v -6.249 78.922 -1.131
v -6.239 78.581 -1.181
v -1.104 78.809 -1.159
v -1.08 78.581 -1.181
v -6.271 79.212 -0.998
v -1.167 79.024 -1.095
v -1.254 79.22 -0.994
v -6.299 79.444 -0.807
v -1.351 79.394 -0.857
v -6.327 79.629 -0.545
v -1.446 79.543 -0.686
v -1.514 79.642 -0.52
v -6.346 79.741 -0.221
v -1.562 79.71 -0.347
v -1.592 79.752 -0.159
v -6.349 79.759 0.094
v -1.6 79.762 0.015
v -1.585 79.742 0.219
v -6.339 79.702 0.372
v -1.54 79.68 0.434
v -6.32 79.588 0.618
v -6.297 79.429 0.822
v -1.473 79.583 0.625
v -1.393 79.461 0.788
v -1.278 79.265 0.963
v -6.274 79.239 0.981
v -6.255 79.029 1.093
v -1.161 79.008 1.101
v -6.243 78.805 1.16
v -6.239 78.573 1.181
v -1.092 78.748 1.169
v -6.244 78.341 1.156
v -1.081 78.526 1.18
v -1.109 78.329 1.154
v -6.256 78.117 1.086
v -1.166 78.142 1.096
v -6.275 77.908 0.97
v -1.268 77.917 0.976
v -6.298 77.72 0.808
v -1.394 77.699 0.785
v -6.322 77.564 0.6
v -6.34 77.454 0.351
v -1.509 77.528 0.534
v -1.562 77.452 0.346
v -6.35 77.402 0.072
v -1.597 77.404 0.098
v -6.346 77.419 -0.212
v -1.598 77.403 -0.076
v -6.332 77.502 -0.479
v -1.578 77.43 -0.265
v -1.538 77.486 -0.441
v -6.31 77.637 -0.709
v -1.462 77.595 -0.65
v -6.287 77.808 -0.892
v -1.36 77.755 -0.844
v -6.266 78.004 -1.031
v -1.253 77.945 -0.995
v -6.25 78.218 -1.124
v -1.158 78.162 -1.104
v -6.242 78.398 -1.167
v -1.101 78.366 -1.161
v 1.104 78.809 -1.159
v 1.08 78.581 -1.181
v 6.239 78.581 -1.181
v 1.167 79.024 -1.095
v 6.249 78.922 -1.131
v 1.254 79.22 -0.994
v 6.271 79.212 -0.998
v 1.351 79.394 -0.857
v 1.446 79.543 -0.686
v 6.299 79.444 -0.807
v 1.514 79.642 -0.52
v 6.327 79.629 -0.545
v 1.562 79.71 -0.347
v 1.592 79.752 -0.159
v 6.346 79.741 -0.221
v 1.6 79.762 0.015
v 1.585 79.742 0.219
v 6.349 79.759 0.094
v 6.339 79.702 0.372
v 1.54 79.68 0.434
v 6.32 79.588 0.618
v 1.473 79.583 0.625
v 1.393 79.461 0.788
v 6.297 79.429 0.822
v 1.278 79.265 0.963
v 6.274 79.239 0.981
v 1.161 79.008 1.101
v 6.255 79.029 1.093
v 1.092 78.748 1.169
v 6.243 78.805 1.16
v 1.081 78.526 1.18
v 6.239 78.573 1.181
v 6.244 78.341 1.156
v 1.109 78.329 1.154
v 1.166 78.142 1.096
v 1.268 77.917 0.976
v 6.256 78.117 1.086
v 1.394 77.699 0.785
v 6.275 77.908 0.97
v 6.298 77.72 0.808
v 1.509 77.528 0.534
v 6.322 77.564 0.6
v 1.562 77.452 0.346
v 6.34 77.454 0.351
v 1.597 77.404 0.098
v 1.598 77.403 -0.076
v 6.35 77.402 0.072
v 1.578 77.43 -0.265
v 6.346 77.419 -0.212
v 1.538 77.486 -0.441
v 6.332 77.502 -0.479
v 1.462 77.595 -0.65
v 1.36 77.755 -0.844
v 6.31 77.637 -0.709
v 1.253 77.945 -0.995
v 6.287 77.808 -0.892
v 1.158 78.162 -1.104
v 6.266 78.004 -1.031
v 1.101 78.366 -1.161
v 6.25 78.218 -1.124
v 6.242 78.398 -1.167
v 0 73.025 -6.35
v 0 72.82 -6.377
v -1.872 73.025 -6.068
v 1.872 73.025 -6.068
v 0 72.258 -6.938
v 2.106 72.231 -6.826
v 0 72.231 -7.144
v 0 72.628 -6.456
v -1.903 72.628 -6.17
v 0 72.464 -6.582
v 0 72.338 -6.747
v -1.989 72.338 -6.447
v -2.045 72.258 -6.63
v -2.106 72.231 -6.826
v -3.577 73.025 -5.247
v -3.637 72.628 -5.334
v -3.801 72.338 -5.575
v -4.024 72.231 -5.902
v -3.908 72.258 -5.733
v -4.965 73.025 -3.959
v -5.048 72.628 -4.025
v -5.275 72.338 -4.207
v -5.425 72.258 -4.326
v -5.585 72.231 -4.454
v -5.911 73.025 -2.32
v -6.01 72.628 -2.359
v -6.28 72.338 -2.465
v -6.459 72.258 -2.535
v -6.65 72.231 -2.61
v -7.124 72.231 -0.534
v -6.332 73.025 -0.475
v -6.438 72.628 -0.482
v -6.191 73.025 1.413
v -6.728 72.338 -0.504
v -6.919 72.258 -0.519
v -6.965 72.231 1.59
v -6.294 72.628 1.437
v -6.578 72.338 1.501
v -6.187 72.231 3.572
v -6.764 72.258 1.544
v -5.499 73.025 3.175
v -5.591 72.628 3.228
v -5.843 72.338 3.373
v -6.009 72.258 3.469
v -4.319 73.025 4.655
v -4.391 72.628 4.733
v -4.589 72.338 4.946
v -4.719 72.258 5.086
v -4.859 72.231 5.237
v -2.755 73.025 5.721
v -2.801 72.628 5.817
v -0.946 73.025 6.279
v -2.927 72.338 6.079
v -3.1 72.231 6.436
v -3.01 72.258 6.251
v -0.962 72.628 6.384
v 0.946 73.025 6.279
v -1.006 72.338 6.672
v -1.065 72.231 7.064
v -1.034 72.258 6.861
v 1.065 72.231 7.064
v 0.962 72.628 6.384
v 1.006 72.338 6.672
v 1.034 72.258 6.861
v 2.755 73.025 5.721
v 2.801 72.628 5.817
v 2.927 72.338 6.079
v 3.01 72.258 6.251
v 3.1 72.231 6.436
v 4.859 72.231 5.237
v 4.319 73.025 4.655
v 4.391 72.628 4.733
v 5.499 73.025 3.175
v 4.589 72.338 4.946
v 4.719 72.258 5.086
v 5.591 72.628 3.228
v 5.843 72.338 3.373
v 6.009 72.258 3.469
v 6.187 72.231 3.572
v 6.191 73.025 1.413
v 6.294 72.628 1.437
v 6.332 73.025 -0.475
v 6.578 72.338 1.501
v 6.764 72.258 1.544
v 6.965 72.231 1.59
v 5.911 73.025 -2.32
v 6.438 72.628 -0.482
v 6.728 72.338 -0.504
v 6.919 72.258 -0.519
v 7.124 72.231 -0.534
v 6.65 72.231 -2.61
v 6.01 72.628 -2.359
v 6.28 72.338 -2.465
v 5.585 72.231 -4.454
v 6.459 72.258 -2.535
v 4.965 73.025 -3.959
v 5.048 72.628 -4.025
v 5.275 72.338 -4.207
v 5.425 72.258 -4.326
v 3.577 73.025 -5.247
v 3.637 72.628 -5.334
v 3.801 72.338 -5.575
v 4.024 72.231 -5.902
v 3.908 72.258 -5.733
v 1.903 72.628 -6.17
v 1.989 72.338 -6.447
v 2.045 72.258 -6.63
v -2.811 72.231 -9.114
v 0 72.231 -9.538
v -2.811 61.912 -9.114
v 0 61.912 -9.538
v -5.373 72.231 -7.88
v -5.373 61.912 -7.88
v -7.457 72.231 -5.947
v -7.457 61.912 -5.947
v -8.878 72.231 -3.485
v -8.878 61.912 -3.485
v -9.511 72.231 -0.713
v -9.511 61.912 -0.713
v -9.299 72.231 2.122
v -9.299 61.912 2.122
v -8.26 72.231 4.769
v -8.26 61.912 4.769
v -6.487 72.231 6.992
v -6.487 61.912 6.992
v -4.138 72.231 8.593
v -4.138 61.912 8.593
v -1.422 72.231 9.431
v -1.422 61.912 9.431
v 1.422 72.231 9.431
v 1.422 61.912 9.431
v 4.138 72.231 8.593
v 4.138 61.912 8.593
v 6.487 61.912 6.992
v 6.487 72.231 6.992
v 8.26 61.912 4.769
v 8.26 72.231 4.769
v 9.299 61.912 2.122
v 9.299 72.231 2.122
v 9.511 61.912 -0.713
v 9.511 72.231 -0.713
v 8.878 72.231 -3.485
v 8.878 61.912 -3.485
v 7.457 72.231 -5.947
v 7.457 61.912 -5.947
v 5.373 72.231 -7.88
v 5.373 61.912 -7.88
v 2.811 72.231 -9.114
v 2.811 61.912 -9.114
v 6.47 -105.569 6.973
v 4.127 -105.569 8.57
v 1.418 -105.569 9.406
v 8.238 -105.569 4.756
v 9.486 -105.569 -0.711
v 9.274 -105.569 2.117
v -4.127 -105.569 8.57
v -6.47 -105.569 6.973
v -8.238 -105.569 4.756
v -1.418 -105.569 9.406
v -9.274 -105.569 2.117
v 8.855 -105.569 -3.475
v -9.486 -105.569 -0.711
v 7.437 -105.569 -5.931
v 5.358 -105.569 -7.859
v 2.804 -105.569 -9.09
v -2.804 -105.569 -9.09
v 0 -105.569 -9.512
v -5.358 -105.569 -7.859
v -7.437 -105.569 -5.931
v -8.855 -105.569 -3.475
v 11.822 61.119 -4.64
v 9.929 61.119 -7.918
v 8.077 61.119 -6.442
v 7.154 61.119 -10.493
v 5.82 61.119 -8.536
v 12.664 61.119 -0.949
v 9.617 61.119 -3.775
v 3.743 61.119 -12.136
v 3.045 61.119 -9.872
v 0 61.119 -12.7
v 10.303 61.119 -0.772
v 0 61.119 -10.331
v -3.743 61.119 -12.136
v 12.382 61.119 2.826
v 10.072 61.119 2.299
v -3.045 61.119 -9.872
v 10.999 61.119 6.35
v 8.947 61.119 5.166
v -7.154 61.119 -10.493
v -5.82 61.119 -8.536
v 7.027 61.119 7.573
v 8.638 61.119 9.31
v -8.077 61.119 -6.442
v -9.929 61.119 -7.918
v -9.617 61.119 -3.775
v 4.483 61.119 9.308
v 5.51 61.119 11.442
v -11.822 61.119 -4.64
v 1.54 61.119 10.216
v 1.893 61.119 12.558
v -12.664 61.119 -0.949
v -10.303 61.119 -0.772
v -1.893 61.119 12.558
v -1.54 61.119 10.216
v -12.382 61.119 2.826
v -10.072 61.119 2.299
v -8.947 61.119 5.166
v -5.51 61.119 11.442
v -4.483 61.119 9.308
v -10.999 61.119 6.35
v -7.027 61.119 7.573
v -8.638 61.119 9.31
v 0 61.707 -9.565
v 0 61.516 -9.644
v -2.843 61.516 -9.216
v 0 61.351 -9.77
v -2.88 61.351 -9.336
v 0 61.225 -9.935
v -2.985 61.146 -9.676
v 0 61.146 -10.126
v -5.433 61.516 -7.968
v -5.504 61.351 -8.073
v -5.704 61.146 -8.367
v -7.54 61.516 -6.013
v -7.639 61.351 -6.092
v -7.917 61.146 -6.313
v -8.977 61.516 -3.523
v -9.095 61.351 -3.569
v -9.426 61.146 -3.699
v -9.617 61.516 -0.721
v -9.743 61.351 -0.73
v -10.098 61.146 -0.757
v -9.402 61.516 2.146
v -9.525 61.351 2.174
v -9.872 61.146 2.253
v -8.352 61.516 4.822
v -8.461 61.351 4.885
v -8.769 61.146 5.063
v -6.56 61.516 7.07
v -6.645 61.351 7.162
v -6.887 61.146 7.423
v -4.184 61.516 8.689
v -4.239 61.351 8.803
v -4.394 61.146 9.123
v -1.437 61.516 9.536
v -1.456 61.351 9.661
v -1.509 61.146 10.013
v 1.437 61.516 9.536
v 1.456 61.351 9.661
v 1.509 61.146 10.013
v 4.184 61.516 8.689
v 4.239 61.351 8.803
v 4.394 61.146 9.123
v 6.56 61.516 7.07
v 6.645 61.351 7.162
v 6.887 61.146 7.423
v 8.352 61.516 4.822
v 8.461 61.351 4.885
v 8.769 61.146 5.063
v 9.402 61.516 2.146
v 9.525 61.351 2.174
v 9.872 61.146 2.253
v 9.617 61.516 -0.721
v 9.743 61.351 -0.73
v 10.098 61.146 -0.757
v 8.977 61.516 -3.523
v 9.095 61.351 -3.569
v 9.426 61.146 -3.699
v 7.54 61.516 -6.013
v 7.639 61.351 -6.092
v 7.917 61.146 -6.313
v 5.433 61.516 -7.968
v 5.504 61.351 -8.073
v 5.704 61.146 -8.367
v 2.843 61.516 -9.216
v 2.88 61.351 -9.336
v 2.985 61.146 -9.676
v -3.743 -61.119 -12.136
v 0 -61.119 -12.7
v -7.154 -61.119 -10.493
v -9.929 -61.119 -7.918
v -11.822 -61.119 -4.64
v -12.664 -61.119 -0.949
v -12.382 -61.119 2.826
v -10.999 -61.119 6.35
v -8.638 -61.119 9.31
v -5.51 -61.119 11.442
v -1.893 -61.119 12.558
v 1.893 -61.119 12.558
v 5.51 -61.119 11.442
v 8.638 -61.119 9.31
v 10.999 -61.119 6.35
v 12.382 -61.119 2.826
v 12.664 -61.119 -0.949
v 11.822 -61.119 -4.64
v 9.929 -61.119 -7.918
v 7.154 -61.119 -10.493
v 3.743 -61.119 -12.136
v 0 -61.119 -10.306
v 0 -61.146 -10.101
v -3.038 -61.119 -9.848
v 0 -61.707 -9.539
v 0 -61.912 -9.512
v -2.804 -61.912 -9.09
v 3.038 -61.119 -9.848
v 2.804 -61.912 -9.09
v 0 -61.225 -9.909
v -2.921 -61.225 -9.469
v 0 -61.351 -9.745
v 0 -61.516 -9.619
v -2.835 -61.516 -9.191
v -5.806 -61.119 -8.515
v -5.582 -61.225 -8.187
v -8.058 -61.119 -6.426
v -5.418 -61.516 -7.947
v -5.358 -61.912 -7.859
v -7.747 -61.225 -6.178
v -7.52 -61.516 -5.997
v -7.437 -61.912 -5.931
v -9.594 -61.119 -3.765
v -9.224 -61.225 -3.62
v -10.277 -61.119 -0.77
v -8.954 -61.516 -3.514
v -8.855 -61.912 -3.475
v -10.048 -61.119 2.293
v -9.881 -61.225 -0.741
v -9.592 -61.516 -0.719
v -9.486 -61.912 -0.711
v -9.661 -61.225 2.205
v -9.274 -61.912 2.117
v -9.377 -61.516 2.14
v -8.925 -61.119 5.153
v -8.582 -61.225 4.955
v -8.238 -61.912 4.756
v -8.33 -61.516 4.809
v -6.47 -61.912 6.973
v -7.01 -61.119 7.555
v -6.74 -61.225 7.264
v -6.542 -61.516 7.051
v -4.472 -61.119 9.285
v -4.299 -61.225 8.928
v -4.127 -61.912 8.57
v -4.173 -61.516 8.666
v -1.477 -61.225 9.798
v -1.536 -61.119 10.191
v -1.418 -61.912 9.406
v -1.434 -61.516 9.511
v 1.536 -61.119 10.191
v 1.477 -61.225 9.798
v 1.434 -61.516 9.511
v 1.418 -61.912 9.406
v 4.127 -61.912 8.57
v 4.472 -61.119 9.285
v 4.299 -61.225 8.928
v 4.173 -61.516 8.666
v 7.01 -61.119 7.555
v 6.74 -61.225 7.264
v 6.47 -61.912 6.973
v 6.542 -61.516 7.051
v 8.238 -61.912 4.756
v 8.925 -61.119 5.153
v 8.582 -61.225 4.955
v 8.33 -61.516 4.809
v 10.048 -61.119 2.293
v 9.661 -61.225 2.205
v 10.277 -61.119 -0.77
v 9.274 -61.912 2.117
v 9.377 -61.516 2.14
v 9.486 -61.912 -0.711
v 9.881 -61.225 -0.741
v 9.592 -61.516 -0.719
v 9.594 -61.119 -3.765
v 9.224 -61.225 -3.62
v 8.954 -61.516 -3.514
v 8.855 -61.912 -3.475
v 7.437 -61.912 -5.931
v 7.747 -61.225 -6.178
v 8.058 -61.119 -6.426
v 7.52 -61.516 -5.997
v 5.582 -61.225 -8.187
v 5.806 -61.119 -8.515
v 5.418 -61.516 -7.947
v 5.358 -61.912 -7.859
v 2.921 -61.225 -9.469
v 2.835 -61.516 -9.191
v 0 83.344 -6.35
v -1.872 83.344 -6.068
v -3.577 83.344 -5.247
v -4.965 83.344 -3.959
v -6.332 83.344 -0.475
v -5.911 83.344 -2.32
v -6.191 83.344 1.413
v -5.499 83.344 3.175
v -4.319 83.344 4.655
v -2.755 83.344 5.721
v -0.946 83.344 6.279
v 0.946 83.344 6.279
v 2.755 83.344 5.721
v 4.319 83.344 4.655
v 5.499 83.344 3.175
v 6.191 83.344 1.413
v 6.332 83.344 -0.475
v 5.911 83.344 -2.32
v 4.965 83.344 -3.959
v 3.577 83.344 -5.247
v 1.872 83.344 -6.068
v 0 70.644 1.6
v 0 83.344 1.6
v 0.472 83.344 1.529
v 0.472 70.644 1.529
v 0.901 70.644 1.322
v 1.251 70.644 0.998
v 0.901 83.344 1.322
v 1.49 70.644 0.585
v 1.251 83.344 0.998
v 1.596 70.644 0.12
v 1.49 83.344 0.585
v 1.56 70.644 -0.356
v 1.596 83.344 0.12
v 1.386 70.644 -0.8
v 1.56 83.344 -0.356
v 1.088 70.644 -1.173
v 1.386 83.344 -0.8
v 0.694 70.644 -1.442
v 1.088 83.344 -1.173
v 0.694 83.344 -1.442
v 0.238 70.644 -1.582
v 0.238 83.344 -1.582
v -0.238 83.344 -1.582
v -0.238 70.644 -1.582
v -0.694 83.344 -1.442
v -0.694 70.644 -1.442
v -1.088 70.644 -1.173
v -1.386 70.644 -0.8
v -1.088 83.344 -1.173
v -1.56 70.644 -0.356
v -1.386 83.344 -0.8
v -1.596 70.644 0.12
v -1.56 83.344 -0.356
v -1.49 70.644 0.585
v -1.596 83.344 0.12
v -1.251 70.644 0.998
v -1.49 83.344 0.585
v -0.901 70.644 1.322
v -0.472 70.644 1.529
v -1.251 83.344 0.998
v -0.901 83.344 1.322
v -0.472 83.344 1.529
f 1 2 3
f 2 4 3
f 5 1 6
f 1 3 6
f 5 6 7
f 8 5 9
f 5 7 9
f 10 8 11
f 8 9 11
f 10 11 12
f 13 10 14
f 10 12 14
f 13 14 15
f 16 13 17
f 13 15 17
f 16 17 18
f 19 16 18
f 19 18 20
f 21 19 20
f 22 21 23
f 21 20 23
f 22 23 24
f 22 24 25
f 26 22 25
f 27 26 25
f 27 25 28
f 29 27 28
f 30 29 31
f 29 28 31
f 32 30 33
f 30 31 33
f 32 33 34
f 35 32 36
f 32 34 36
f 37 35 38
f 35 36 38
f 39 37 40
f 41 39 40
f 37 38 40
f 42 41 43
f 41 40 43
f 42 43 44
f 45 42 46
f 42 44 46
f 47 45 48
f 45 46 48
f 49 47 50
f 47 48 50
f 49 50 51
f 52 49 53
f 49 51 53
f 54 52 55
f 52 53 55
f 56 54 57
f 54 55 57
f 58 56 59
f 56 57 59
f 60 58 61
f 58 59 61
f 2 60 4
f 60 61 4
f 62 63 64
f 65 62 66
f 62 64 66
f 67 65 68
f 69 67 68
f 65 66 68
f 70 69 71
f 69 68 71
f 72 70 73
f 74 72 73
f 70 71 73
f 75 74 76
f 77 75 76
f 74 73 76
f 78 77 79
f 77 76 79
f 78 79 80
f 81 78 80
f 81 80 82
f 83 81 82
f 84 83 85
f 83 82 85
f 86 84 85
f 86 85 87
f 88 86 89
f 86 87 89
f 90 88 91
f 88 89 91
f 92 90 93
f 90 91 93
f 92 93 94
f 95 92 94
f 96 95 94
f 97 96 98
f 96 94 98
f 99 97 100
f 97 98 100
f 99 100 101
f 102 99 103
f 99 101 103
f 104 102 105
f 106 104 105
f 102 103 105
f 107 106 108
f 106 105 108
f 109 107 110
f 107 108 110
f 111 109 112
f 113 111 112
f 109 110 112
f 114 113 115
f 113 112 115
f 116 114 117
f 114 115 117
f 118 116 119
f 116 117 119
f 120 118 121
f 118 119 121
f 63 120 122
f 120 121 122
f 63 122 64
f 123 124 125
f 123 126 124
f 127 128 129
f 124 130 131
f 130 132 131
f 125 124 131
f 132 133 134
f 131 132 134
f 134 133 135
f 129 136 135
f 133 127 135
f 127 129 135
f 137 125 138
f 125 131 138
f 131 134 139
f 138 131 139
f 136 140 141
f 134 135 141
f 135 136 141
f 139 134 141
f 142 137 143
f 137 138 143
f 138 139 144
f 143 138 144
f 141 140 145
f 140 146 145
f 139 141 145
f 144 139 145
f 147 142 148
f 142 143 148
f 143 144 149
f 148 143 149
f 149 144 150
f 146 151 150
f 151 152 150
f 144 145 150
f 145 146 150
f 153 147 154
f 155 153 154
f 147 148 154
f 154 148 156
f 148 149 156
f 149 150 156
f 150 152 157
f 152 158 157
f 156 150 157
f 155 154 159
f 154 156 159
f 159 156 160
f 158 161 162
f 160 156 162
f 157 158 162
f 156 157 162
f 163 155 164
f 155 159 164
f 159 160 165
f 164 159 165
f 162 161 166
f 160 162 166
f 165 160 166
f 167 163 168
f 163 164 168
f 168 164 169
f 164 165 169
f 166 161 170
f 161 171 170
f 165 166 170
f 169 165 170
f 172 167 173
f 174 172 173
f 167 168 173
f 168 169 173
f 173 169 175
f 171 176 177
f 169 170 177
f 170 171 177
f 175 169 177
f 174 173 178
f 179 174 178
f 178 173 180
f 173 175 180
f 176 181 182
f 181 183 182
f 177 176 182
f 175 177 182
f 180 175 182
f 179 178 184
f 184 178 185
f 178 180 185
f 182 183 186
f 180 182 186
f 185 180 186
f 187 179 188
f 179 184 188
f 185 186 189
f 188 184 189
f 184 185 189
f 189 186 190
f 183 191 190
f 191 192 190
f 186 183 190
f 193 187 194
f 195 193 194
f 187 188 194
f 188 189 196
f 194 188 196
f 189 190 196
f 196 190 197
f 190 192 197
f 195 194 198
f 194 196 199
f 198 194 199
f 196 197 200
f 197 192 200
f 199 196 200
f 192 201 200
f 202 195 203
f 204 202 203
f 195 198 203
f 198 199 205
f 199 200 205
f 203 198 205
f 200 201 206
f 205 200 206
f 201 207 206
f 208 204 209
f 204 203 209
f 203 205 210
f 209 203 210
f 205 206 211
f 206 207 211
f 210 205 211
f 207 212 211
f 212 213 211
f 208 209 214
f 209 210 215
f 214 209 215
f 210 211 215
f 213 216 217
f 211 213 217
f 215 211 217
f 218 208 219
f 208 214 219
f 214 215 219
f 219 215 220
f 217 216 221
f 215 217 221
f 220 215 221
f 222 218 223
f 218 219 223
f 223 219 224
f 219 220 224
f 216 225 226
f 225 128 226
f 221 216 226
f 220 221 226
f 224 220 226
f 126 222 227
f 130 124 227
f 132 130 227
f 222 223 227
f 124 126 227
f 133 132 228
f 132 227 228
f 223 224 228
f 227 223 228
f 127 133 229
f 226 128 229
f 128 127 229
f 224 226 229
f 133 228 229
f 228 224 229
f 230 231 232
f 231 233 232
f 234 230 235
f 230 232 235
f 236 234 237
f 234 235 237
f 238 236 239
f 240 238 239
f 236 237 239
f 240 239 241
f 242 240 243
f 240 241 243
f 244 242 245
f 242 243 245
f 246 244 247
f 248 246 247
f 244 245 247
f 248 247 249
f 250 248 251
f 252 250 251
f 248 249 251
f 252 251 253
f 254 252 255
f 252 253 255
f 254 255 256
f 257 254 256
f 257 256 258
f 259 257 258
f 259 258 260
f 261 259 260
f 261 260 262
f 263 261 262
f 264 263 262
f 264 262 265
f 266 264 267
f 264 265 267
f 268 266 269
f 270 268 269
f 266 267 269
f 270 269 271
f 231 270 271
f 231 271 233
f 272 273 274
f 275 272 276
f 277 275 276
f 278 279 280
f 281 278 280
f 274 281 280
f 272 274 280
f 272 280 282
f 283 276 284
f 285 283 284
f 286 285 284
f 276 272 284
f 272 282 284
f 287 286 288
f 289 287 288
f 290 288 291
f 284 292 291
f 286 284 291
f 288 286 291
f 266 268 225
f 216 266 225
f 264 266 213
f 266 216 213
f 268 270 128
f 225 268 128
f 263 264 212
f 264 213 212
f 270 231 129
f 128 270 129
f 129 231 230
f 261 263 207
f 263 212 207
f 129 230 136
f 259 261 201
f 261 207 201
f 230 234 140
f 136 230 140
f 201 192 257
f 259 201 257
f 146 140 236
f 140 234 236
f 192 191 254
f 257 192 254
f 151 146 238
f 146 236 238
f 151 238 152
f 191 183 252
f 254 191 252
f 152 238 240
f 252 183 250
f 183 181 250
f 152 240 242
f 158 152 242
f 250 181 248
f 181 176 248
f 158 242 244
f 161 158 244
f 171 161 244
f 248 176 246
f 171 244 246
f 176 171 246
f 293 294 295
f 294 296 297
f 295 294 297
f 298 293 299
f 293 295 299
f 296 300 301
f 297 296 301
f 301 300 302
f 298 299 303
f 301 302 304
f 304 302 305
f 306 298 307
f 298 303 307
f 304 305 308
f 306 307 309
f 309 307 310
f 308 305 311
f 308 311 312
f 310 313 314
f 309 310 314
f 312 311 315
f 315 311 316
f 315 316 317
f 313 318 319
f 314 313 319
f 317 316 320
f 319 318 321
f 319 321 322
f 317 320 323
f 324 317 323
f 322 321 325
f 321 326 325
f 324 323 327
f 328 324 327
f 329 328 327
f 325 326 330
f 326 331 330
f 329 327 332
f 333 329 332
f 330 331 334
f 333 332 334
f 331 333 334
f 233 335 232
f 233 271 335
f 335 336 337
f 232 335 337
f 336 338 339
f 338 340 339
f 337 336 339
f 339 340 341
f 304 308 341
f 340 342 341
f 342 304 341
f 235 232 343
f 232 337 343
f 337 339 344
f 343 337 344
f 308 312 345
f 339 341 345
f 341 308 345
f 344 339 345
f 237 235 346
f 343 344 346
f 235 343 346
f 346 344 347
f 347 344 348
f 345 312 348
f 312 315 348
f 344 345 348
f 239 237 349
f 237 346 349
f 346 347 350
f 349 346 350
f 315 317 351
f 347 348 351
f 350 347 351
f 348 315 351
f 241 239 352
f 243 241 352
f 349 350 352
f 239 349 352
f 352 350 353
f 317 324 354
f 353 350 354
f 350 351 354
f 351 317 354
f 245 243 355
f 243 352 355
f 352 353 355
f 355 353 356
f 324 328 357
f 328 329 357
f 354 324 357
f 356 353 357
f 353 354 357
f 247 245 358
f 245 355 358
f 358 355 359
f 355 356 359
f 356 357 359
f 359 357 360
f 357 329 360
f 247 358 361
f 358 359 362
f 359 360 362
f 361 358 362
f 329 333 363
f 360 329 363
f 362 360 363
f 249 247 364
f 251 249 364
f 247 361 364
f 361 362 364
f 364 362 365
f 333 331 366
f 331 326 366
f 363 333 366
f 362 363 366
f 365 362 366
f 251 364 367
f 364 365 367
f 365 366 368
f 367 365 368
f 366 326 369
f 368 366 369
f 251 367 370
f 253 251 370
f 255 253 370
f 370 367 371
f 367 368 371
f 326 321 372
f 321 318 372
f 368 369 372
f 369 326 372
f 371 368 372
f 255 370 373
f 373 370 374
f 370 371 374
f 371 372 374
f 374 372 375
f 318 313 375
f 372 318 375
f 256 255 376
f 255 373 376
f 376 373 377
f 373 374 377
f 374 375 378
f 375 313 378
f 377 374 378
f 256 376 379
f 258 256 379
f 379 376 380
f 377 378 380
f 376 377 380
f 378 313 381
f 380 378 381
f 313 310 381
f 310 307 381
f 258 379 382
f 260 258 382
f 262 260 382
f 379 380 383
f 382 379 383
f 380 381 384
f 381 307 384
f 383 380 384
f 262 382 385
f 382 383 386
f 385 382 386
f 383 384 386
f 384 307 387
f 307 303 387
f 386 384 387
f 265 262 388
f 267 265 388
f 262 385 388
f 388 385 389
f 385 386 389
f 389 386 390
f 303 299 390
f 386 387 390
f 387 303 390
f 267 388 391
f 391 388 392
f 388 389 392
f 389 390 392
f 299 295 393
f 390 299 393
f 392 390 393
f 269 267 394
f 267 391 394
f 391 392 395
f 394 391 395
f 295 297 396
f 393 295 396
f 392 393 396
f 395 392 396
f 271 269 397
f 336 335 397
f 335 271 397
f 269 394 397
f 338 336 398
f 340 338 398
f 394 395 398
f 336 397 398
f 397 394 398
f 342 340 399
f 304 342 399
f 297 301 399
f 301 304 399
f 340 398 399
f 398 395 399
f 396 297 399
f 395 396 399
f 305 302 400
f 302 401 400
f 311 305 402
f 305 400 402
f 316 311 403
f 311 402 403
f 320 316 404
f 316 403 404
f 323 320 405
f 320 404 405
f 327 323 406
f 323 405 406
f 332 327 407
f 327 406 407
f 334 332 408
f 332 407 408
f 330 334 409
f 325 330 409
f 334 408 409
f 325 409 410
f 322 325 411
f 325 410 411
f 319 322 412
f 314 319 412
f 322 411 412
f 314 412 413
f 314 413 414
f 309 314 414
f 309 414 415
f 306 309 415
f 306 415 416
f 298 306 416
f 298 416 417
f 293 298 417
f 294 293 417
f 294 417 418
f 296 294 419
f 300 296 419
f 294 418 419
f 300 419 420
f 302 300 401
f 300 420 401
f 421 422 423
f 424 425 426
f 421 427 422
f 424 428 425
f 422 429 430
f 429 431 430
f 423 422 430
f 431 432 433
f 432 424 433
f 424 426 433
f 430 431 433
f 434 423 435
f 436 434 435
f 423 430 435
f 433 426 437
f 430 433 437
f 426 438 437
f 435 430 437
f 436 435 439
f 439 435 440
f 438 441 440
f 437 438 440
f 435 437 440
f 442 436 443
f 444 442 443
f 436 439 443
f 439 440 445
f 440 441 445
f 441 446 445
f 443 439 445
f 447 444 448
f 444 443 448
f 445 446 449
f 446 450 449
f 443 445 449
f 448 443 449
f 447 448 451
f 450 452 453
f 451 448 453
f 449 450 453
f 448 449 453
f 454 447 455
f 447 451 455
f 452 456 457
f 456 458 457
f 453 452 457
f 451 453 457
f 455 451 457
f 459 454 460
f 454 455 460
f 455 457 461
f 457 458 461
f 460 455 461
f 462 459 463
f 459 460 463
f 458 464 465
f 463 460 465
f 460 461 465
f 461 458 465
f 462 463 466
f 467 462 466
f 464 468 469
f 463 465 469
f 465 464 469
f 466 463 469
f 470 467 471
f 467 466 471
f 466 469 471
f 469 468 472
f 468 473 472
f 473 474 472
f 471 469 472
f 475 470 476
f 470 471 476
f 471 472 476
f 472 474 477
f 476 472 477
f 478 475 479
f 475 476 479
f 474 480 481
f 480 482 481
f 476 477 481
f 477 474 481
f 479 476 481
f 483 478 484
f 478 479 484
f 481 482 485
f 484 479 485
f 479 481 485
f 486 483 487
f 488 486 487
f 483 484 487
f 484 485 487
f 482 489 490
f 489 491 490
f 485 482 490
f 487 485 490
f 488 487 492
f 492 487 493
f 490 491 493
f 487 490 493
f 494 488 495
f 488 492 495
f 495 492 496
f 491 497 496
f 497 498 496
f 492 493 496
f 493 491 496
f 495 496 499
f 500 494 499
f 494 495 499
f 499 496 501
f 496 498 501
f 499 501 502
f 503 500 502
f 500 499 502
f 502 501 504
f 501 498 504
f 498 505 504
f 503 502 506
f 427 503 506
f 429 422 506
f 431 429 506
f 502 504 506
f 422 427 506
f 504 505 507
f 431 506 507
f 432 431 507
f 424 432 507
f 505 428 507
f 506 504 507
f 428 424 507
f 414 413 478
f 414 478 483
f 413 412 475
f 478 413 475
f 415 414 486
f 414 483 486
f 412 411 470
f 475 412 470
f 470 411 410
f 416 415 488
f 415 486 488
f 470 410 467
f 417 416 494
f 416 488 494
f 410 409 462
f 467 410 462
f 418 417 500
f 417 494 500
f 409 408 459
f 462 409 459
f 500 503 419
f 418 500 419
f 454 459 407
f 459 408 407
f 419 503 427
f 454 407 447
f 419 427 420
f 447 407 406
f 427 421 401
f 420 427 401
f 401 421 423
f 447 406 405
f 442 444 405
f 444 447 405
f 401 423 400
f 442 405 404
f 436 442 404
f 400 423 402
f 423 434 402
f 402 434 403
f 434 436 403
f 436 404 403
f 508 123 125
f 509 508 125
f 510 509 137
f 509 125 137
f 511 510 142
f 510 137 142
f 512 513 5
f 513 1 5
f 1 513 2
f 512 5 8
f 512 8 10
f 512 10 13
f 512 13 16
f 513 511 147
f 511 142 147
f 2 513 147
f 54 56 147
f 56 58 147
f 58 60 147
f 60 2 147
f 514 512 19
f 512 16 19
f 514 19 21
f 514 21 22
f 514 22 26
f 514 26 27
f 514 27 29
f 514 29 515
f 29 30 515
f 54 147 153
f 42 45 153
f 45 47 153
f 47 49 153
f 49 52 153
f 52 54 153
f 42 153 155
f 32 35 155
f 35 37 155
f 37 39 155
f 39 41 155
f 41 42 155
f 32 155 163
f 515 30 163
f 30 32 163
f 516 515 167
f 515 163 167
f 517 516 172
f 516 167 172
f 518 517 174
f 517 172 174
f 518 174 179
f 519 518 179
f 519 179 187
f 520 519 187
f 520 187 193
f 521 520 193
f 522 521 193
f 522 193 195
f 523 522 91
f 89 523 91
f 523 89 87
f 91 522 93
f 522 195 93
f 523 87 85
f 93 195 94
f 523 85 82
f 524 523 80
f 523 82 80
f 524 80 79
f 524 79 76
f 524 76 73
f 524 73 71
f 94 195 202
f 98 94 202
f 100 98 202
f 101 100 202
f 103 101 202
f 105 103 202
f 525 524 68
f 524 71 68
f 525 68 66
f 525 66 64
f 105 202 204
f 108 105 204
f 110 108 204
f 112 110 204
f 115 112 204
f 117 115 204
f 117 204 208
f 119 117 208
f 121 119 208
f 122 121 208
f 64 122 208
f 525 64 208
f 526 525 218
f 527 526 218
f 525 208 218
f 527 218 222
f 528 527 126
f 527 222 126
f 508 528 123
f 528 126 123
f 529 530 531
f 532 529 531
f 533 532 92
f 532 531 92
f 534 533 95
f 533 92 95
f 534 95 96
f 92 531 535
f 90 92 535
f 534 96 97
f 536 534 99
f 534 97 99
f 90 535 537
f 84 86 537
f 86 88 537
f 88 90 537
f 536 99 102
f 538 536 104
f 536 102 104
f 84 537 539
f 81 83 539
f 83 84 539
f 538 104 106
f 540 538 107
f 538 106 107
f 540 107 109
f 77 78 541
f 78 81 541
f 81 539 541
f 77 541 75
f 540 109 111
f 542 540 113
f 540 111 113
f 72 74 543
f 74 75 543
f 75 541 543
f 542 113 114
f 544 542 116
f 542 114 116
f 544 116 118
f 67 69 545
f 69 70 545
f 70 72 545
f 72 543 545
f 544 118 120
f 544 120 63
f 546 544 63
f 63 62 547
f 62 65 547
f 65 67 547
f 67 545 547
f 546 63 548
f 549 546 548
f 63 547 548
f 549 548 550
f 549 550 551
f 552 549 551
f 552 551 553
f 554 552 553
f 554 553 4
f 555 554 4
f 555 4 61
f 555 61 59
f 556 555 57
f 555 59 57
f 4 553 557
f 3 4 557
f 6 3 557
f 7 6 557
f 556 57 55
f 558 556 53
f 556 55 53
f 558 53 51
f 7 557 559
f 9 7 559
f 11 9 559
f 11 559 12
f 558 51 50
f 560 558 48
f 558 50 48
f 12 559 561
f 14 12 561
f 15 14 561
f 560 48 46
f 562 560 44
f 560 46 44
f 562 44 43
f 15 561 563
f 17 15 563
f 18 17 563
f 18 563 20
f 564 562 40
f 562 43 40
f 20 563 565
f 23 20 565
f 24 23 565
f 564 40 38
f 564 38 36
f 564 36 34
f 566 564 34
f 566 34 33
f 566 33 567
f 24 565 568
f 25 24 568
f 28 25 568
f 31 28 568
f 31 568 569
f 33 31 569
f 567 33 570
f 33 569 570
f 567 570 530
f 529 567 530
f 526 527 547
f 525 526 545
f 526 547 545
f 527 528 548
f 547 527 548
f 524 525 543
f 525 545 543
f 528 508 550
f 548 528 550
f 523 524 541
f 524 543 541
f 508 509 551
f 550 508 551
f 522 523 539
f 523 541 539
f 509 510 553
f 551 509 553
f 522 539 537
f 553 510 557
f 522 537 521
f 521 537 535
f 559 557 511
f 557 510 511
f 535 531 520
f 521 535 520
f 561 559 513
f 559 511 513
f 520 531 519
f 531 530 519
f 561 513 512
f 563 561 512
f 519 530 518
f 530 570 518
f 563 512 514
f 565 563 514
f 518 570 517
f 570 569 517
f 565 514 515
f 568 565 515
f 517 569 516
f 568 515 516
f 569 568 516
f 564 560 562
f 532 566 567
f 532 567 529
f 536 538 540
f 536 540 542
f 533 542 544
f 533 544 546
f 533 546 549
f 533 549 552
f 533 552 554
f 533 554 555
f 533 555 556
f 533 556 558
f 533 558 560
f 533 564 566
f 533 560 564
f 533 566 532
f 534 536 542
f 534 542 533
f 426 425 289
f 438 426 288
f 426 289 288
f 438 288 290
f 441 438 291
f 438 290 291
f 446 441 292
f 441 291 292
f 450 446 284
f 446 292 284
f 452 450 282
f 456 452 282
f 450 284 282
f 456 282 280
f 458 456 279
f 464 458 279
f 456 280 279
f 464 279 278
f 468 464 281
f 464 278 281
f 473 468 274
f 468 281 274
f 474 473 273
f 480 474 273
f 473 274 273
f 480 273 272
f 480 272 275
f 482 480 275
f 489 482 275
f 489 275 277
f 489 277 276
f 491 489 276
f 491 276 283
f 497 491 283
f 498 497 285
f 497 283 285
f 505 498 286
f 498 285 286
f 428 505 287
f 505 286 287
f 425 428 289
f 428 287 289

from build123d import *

# Parameters (mm, degrees)
SKETCH2_R          = 1.6002
CUT_EXTRUDE1_DEPTH = 12.7
SKETCH3_R          = 1.1811
CUT_EXTRUDE2_DEPTH = 12.7


with BuildPart() as part:
    # Sketch1 → Revolve1 (revolve)
    with BuildSketch(Plane.XY, mode=Mode.PRIVATE) as revolve1_sk:
        with BuildLine():
            Line((0, 83.34375), (-6.35, 83.34375))
            Line((-6.35, 83.34375), (-6.35, 73.025))
            ThreePointArc((-6.35, 73.025), (-6.582483992, 72.463733992), (-7.14375, 72.23125))
            Line((-7.14375, 72.23125), (-9.5377, 72.23125))
            Line((-9.5377, 72.23125), (-9.5377, 61.9125))
            ThreePointArc((-9.5377, 61.9125), (-9.770183992, 61.351233992), (-10.33145, 61.11875))
            Line((-10.33145, 61.11875), (-12.7, 61.11875))
            Line((-12.7, 61.11875), (-12.7, 0))
            Line((-12.7, 0), (-12.7, -61.11875))
            Line((-12.7, -61.11875), (-10.30605, -61.11875))
            ThreePointArc((-10.30605, -61.11875), (-9.744783992, -61.351233992), (-9.5123, -61.9125))
            Line((-9.5123, -61.9125), (-9.5123, -105.56875))
            Line((-9.5123, -105.56875), (0, -105.56875))
            Line((0, -105.56875), (0, 83.34375))
        make_face()
    revolve(revolve1_sk.sketch.rotate(Axis((0, -122.193490481, 0), (0, 1, 0)), 270), axis=Axis((0, -122.193490481, 0), (0, 1, 0)))

    # Sketch2 → Cut-Extrude1 (cut)
    with BuildSketch(Plane(origin=(0, 83.34375, 0), x_dir=(1, 0, 0), z_dir=(0, 1, 0))):
        with Locations(Location((0, 0, 0), (0, 0, 270))):
            Circle(SKETCH2_R)
    extrude(amount=-CUT_EXTRUDE1_DEPTH, mode=Mode.SUBTRACT)

    # Sketch3 → Cut-Extrude2 (cut, symmetric)
    with BuildSketch(Plane(origin=(0, 0, 0), x_dir=(0, 0, -1), z_dir=(1, 0, 0))):
        with Locations((0, 78.58125)):
            Circle(SKETCH3_R)
    extrude(amount=CUT_EXTRUDE2_DEPTH, both=True, mode=Mode.SUBTRACT)


solid = part.part
